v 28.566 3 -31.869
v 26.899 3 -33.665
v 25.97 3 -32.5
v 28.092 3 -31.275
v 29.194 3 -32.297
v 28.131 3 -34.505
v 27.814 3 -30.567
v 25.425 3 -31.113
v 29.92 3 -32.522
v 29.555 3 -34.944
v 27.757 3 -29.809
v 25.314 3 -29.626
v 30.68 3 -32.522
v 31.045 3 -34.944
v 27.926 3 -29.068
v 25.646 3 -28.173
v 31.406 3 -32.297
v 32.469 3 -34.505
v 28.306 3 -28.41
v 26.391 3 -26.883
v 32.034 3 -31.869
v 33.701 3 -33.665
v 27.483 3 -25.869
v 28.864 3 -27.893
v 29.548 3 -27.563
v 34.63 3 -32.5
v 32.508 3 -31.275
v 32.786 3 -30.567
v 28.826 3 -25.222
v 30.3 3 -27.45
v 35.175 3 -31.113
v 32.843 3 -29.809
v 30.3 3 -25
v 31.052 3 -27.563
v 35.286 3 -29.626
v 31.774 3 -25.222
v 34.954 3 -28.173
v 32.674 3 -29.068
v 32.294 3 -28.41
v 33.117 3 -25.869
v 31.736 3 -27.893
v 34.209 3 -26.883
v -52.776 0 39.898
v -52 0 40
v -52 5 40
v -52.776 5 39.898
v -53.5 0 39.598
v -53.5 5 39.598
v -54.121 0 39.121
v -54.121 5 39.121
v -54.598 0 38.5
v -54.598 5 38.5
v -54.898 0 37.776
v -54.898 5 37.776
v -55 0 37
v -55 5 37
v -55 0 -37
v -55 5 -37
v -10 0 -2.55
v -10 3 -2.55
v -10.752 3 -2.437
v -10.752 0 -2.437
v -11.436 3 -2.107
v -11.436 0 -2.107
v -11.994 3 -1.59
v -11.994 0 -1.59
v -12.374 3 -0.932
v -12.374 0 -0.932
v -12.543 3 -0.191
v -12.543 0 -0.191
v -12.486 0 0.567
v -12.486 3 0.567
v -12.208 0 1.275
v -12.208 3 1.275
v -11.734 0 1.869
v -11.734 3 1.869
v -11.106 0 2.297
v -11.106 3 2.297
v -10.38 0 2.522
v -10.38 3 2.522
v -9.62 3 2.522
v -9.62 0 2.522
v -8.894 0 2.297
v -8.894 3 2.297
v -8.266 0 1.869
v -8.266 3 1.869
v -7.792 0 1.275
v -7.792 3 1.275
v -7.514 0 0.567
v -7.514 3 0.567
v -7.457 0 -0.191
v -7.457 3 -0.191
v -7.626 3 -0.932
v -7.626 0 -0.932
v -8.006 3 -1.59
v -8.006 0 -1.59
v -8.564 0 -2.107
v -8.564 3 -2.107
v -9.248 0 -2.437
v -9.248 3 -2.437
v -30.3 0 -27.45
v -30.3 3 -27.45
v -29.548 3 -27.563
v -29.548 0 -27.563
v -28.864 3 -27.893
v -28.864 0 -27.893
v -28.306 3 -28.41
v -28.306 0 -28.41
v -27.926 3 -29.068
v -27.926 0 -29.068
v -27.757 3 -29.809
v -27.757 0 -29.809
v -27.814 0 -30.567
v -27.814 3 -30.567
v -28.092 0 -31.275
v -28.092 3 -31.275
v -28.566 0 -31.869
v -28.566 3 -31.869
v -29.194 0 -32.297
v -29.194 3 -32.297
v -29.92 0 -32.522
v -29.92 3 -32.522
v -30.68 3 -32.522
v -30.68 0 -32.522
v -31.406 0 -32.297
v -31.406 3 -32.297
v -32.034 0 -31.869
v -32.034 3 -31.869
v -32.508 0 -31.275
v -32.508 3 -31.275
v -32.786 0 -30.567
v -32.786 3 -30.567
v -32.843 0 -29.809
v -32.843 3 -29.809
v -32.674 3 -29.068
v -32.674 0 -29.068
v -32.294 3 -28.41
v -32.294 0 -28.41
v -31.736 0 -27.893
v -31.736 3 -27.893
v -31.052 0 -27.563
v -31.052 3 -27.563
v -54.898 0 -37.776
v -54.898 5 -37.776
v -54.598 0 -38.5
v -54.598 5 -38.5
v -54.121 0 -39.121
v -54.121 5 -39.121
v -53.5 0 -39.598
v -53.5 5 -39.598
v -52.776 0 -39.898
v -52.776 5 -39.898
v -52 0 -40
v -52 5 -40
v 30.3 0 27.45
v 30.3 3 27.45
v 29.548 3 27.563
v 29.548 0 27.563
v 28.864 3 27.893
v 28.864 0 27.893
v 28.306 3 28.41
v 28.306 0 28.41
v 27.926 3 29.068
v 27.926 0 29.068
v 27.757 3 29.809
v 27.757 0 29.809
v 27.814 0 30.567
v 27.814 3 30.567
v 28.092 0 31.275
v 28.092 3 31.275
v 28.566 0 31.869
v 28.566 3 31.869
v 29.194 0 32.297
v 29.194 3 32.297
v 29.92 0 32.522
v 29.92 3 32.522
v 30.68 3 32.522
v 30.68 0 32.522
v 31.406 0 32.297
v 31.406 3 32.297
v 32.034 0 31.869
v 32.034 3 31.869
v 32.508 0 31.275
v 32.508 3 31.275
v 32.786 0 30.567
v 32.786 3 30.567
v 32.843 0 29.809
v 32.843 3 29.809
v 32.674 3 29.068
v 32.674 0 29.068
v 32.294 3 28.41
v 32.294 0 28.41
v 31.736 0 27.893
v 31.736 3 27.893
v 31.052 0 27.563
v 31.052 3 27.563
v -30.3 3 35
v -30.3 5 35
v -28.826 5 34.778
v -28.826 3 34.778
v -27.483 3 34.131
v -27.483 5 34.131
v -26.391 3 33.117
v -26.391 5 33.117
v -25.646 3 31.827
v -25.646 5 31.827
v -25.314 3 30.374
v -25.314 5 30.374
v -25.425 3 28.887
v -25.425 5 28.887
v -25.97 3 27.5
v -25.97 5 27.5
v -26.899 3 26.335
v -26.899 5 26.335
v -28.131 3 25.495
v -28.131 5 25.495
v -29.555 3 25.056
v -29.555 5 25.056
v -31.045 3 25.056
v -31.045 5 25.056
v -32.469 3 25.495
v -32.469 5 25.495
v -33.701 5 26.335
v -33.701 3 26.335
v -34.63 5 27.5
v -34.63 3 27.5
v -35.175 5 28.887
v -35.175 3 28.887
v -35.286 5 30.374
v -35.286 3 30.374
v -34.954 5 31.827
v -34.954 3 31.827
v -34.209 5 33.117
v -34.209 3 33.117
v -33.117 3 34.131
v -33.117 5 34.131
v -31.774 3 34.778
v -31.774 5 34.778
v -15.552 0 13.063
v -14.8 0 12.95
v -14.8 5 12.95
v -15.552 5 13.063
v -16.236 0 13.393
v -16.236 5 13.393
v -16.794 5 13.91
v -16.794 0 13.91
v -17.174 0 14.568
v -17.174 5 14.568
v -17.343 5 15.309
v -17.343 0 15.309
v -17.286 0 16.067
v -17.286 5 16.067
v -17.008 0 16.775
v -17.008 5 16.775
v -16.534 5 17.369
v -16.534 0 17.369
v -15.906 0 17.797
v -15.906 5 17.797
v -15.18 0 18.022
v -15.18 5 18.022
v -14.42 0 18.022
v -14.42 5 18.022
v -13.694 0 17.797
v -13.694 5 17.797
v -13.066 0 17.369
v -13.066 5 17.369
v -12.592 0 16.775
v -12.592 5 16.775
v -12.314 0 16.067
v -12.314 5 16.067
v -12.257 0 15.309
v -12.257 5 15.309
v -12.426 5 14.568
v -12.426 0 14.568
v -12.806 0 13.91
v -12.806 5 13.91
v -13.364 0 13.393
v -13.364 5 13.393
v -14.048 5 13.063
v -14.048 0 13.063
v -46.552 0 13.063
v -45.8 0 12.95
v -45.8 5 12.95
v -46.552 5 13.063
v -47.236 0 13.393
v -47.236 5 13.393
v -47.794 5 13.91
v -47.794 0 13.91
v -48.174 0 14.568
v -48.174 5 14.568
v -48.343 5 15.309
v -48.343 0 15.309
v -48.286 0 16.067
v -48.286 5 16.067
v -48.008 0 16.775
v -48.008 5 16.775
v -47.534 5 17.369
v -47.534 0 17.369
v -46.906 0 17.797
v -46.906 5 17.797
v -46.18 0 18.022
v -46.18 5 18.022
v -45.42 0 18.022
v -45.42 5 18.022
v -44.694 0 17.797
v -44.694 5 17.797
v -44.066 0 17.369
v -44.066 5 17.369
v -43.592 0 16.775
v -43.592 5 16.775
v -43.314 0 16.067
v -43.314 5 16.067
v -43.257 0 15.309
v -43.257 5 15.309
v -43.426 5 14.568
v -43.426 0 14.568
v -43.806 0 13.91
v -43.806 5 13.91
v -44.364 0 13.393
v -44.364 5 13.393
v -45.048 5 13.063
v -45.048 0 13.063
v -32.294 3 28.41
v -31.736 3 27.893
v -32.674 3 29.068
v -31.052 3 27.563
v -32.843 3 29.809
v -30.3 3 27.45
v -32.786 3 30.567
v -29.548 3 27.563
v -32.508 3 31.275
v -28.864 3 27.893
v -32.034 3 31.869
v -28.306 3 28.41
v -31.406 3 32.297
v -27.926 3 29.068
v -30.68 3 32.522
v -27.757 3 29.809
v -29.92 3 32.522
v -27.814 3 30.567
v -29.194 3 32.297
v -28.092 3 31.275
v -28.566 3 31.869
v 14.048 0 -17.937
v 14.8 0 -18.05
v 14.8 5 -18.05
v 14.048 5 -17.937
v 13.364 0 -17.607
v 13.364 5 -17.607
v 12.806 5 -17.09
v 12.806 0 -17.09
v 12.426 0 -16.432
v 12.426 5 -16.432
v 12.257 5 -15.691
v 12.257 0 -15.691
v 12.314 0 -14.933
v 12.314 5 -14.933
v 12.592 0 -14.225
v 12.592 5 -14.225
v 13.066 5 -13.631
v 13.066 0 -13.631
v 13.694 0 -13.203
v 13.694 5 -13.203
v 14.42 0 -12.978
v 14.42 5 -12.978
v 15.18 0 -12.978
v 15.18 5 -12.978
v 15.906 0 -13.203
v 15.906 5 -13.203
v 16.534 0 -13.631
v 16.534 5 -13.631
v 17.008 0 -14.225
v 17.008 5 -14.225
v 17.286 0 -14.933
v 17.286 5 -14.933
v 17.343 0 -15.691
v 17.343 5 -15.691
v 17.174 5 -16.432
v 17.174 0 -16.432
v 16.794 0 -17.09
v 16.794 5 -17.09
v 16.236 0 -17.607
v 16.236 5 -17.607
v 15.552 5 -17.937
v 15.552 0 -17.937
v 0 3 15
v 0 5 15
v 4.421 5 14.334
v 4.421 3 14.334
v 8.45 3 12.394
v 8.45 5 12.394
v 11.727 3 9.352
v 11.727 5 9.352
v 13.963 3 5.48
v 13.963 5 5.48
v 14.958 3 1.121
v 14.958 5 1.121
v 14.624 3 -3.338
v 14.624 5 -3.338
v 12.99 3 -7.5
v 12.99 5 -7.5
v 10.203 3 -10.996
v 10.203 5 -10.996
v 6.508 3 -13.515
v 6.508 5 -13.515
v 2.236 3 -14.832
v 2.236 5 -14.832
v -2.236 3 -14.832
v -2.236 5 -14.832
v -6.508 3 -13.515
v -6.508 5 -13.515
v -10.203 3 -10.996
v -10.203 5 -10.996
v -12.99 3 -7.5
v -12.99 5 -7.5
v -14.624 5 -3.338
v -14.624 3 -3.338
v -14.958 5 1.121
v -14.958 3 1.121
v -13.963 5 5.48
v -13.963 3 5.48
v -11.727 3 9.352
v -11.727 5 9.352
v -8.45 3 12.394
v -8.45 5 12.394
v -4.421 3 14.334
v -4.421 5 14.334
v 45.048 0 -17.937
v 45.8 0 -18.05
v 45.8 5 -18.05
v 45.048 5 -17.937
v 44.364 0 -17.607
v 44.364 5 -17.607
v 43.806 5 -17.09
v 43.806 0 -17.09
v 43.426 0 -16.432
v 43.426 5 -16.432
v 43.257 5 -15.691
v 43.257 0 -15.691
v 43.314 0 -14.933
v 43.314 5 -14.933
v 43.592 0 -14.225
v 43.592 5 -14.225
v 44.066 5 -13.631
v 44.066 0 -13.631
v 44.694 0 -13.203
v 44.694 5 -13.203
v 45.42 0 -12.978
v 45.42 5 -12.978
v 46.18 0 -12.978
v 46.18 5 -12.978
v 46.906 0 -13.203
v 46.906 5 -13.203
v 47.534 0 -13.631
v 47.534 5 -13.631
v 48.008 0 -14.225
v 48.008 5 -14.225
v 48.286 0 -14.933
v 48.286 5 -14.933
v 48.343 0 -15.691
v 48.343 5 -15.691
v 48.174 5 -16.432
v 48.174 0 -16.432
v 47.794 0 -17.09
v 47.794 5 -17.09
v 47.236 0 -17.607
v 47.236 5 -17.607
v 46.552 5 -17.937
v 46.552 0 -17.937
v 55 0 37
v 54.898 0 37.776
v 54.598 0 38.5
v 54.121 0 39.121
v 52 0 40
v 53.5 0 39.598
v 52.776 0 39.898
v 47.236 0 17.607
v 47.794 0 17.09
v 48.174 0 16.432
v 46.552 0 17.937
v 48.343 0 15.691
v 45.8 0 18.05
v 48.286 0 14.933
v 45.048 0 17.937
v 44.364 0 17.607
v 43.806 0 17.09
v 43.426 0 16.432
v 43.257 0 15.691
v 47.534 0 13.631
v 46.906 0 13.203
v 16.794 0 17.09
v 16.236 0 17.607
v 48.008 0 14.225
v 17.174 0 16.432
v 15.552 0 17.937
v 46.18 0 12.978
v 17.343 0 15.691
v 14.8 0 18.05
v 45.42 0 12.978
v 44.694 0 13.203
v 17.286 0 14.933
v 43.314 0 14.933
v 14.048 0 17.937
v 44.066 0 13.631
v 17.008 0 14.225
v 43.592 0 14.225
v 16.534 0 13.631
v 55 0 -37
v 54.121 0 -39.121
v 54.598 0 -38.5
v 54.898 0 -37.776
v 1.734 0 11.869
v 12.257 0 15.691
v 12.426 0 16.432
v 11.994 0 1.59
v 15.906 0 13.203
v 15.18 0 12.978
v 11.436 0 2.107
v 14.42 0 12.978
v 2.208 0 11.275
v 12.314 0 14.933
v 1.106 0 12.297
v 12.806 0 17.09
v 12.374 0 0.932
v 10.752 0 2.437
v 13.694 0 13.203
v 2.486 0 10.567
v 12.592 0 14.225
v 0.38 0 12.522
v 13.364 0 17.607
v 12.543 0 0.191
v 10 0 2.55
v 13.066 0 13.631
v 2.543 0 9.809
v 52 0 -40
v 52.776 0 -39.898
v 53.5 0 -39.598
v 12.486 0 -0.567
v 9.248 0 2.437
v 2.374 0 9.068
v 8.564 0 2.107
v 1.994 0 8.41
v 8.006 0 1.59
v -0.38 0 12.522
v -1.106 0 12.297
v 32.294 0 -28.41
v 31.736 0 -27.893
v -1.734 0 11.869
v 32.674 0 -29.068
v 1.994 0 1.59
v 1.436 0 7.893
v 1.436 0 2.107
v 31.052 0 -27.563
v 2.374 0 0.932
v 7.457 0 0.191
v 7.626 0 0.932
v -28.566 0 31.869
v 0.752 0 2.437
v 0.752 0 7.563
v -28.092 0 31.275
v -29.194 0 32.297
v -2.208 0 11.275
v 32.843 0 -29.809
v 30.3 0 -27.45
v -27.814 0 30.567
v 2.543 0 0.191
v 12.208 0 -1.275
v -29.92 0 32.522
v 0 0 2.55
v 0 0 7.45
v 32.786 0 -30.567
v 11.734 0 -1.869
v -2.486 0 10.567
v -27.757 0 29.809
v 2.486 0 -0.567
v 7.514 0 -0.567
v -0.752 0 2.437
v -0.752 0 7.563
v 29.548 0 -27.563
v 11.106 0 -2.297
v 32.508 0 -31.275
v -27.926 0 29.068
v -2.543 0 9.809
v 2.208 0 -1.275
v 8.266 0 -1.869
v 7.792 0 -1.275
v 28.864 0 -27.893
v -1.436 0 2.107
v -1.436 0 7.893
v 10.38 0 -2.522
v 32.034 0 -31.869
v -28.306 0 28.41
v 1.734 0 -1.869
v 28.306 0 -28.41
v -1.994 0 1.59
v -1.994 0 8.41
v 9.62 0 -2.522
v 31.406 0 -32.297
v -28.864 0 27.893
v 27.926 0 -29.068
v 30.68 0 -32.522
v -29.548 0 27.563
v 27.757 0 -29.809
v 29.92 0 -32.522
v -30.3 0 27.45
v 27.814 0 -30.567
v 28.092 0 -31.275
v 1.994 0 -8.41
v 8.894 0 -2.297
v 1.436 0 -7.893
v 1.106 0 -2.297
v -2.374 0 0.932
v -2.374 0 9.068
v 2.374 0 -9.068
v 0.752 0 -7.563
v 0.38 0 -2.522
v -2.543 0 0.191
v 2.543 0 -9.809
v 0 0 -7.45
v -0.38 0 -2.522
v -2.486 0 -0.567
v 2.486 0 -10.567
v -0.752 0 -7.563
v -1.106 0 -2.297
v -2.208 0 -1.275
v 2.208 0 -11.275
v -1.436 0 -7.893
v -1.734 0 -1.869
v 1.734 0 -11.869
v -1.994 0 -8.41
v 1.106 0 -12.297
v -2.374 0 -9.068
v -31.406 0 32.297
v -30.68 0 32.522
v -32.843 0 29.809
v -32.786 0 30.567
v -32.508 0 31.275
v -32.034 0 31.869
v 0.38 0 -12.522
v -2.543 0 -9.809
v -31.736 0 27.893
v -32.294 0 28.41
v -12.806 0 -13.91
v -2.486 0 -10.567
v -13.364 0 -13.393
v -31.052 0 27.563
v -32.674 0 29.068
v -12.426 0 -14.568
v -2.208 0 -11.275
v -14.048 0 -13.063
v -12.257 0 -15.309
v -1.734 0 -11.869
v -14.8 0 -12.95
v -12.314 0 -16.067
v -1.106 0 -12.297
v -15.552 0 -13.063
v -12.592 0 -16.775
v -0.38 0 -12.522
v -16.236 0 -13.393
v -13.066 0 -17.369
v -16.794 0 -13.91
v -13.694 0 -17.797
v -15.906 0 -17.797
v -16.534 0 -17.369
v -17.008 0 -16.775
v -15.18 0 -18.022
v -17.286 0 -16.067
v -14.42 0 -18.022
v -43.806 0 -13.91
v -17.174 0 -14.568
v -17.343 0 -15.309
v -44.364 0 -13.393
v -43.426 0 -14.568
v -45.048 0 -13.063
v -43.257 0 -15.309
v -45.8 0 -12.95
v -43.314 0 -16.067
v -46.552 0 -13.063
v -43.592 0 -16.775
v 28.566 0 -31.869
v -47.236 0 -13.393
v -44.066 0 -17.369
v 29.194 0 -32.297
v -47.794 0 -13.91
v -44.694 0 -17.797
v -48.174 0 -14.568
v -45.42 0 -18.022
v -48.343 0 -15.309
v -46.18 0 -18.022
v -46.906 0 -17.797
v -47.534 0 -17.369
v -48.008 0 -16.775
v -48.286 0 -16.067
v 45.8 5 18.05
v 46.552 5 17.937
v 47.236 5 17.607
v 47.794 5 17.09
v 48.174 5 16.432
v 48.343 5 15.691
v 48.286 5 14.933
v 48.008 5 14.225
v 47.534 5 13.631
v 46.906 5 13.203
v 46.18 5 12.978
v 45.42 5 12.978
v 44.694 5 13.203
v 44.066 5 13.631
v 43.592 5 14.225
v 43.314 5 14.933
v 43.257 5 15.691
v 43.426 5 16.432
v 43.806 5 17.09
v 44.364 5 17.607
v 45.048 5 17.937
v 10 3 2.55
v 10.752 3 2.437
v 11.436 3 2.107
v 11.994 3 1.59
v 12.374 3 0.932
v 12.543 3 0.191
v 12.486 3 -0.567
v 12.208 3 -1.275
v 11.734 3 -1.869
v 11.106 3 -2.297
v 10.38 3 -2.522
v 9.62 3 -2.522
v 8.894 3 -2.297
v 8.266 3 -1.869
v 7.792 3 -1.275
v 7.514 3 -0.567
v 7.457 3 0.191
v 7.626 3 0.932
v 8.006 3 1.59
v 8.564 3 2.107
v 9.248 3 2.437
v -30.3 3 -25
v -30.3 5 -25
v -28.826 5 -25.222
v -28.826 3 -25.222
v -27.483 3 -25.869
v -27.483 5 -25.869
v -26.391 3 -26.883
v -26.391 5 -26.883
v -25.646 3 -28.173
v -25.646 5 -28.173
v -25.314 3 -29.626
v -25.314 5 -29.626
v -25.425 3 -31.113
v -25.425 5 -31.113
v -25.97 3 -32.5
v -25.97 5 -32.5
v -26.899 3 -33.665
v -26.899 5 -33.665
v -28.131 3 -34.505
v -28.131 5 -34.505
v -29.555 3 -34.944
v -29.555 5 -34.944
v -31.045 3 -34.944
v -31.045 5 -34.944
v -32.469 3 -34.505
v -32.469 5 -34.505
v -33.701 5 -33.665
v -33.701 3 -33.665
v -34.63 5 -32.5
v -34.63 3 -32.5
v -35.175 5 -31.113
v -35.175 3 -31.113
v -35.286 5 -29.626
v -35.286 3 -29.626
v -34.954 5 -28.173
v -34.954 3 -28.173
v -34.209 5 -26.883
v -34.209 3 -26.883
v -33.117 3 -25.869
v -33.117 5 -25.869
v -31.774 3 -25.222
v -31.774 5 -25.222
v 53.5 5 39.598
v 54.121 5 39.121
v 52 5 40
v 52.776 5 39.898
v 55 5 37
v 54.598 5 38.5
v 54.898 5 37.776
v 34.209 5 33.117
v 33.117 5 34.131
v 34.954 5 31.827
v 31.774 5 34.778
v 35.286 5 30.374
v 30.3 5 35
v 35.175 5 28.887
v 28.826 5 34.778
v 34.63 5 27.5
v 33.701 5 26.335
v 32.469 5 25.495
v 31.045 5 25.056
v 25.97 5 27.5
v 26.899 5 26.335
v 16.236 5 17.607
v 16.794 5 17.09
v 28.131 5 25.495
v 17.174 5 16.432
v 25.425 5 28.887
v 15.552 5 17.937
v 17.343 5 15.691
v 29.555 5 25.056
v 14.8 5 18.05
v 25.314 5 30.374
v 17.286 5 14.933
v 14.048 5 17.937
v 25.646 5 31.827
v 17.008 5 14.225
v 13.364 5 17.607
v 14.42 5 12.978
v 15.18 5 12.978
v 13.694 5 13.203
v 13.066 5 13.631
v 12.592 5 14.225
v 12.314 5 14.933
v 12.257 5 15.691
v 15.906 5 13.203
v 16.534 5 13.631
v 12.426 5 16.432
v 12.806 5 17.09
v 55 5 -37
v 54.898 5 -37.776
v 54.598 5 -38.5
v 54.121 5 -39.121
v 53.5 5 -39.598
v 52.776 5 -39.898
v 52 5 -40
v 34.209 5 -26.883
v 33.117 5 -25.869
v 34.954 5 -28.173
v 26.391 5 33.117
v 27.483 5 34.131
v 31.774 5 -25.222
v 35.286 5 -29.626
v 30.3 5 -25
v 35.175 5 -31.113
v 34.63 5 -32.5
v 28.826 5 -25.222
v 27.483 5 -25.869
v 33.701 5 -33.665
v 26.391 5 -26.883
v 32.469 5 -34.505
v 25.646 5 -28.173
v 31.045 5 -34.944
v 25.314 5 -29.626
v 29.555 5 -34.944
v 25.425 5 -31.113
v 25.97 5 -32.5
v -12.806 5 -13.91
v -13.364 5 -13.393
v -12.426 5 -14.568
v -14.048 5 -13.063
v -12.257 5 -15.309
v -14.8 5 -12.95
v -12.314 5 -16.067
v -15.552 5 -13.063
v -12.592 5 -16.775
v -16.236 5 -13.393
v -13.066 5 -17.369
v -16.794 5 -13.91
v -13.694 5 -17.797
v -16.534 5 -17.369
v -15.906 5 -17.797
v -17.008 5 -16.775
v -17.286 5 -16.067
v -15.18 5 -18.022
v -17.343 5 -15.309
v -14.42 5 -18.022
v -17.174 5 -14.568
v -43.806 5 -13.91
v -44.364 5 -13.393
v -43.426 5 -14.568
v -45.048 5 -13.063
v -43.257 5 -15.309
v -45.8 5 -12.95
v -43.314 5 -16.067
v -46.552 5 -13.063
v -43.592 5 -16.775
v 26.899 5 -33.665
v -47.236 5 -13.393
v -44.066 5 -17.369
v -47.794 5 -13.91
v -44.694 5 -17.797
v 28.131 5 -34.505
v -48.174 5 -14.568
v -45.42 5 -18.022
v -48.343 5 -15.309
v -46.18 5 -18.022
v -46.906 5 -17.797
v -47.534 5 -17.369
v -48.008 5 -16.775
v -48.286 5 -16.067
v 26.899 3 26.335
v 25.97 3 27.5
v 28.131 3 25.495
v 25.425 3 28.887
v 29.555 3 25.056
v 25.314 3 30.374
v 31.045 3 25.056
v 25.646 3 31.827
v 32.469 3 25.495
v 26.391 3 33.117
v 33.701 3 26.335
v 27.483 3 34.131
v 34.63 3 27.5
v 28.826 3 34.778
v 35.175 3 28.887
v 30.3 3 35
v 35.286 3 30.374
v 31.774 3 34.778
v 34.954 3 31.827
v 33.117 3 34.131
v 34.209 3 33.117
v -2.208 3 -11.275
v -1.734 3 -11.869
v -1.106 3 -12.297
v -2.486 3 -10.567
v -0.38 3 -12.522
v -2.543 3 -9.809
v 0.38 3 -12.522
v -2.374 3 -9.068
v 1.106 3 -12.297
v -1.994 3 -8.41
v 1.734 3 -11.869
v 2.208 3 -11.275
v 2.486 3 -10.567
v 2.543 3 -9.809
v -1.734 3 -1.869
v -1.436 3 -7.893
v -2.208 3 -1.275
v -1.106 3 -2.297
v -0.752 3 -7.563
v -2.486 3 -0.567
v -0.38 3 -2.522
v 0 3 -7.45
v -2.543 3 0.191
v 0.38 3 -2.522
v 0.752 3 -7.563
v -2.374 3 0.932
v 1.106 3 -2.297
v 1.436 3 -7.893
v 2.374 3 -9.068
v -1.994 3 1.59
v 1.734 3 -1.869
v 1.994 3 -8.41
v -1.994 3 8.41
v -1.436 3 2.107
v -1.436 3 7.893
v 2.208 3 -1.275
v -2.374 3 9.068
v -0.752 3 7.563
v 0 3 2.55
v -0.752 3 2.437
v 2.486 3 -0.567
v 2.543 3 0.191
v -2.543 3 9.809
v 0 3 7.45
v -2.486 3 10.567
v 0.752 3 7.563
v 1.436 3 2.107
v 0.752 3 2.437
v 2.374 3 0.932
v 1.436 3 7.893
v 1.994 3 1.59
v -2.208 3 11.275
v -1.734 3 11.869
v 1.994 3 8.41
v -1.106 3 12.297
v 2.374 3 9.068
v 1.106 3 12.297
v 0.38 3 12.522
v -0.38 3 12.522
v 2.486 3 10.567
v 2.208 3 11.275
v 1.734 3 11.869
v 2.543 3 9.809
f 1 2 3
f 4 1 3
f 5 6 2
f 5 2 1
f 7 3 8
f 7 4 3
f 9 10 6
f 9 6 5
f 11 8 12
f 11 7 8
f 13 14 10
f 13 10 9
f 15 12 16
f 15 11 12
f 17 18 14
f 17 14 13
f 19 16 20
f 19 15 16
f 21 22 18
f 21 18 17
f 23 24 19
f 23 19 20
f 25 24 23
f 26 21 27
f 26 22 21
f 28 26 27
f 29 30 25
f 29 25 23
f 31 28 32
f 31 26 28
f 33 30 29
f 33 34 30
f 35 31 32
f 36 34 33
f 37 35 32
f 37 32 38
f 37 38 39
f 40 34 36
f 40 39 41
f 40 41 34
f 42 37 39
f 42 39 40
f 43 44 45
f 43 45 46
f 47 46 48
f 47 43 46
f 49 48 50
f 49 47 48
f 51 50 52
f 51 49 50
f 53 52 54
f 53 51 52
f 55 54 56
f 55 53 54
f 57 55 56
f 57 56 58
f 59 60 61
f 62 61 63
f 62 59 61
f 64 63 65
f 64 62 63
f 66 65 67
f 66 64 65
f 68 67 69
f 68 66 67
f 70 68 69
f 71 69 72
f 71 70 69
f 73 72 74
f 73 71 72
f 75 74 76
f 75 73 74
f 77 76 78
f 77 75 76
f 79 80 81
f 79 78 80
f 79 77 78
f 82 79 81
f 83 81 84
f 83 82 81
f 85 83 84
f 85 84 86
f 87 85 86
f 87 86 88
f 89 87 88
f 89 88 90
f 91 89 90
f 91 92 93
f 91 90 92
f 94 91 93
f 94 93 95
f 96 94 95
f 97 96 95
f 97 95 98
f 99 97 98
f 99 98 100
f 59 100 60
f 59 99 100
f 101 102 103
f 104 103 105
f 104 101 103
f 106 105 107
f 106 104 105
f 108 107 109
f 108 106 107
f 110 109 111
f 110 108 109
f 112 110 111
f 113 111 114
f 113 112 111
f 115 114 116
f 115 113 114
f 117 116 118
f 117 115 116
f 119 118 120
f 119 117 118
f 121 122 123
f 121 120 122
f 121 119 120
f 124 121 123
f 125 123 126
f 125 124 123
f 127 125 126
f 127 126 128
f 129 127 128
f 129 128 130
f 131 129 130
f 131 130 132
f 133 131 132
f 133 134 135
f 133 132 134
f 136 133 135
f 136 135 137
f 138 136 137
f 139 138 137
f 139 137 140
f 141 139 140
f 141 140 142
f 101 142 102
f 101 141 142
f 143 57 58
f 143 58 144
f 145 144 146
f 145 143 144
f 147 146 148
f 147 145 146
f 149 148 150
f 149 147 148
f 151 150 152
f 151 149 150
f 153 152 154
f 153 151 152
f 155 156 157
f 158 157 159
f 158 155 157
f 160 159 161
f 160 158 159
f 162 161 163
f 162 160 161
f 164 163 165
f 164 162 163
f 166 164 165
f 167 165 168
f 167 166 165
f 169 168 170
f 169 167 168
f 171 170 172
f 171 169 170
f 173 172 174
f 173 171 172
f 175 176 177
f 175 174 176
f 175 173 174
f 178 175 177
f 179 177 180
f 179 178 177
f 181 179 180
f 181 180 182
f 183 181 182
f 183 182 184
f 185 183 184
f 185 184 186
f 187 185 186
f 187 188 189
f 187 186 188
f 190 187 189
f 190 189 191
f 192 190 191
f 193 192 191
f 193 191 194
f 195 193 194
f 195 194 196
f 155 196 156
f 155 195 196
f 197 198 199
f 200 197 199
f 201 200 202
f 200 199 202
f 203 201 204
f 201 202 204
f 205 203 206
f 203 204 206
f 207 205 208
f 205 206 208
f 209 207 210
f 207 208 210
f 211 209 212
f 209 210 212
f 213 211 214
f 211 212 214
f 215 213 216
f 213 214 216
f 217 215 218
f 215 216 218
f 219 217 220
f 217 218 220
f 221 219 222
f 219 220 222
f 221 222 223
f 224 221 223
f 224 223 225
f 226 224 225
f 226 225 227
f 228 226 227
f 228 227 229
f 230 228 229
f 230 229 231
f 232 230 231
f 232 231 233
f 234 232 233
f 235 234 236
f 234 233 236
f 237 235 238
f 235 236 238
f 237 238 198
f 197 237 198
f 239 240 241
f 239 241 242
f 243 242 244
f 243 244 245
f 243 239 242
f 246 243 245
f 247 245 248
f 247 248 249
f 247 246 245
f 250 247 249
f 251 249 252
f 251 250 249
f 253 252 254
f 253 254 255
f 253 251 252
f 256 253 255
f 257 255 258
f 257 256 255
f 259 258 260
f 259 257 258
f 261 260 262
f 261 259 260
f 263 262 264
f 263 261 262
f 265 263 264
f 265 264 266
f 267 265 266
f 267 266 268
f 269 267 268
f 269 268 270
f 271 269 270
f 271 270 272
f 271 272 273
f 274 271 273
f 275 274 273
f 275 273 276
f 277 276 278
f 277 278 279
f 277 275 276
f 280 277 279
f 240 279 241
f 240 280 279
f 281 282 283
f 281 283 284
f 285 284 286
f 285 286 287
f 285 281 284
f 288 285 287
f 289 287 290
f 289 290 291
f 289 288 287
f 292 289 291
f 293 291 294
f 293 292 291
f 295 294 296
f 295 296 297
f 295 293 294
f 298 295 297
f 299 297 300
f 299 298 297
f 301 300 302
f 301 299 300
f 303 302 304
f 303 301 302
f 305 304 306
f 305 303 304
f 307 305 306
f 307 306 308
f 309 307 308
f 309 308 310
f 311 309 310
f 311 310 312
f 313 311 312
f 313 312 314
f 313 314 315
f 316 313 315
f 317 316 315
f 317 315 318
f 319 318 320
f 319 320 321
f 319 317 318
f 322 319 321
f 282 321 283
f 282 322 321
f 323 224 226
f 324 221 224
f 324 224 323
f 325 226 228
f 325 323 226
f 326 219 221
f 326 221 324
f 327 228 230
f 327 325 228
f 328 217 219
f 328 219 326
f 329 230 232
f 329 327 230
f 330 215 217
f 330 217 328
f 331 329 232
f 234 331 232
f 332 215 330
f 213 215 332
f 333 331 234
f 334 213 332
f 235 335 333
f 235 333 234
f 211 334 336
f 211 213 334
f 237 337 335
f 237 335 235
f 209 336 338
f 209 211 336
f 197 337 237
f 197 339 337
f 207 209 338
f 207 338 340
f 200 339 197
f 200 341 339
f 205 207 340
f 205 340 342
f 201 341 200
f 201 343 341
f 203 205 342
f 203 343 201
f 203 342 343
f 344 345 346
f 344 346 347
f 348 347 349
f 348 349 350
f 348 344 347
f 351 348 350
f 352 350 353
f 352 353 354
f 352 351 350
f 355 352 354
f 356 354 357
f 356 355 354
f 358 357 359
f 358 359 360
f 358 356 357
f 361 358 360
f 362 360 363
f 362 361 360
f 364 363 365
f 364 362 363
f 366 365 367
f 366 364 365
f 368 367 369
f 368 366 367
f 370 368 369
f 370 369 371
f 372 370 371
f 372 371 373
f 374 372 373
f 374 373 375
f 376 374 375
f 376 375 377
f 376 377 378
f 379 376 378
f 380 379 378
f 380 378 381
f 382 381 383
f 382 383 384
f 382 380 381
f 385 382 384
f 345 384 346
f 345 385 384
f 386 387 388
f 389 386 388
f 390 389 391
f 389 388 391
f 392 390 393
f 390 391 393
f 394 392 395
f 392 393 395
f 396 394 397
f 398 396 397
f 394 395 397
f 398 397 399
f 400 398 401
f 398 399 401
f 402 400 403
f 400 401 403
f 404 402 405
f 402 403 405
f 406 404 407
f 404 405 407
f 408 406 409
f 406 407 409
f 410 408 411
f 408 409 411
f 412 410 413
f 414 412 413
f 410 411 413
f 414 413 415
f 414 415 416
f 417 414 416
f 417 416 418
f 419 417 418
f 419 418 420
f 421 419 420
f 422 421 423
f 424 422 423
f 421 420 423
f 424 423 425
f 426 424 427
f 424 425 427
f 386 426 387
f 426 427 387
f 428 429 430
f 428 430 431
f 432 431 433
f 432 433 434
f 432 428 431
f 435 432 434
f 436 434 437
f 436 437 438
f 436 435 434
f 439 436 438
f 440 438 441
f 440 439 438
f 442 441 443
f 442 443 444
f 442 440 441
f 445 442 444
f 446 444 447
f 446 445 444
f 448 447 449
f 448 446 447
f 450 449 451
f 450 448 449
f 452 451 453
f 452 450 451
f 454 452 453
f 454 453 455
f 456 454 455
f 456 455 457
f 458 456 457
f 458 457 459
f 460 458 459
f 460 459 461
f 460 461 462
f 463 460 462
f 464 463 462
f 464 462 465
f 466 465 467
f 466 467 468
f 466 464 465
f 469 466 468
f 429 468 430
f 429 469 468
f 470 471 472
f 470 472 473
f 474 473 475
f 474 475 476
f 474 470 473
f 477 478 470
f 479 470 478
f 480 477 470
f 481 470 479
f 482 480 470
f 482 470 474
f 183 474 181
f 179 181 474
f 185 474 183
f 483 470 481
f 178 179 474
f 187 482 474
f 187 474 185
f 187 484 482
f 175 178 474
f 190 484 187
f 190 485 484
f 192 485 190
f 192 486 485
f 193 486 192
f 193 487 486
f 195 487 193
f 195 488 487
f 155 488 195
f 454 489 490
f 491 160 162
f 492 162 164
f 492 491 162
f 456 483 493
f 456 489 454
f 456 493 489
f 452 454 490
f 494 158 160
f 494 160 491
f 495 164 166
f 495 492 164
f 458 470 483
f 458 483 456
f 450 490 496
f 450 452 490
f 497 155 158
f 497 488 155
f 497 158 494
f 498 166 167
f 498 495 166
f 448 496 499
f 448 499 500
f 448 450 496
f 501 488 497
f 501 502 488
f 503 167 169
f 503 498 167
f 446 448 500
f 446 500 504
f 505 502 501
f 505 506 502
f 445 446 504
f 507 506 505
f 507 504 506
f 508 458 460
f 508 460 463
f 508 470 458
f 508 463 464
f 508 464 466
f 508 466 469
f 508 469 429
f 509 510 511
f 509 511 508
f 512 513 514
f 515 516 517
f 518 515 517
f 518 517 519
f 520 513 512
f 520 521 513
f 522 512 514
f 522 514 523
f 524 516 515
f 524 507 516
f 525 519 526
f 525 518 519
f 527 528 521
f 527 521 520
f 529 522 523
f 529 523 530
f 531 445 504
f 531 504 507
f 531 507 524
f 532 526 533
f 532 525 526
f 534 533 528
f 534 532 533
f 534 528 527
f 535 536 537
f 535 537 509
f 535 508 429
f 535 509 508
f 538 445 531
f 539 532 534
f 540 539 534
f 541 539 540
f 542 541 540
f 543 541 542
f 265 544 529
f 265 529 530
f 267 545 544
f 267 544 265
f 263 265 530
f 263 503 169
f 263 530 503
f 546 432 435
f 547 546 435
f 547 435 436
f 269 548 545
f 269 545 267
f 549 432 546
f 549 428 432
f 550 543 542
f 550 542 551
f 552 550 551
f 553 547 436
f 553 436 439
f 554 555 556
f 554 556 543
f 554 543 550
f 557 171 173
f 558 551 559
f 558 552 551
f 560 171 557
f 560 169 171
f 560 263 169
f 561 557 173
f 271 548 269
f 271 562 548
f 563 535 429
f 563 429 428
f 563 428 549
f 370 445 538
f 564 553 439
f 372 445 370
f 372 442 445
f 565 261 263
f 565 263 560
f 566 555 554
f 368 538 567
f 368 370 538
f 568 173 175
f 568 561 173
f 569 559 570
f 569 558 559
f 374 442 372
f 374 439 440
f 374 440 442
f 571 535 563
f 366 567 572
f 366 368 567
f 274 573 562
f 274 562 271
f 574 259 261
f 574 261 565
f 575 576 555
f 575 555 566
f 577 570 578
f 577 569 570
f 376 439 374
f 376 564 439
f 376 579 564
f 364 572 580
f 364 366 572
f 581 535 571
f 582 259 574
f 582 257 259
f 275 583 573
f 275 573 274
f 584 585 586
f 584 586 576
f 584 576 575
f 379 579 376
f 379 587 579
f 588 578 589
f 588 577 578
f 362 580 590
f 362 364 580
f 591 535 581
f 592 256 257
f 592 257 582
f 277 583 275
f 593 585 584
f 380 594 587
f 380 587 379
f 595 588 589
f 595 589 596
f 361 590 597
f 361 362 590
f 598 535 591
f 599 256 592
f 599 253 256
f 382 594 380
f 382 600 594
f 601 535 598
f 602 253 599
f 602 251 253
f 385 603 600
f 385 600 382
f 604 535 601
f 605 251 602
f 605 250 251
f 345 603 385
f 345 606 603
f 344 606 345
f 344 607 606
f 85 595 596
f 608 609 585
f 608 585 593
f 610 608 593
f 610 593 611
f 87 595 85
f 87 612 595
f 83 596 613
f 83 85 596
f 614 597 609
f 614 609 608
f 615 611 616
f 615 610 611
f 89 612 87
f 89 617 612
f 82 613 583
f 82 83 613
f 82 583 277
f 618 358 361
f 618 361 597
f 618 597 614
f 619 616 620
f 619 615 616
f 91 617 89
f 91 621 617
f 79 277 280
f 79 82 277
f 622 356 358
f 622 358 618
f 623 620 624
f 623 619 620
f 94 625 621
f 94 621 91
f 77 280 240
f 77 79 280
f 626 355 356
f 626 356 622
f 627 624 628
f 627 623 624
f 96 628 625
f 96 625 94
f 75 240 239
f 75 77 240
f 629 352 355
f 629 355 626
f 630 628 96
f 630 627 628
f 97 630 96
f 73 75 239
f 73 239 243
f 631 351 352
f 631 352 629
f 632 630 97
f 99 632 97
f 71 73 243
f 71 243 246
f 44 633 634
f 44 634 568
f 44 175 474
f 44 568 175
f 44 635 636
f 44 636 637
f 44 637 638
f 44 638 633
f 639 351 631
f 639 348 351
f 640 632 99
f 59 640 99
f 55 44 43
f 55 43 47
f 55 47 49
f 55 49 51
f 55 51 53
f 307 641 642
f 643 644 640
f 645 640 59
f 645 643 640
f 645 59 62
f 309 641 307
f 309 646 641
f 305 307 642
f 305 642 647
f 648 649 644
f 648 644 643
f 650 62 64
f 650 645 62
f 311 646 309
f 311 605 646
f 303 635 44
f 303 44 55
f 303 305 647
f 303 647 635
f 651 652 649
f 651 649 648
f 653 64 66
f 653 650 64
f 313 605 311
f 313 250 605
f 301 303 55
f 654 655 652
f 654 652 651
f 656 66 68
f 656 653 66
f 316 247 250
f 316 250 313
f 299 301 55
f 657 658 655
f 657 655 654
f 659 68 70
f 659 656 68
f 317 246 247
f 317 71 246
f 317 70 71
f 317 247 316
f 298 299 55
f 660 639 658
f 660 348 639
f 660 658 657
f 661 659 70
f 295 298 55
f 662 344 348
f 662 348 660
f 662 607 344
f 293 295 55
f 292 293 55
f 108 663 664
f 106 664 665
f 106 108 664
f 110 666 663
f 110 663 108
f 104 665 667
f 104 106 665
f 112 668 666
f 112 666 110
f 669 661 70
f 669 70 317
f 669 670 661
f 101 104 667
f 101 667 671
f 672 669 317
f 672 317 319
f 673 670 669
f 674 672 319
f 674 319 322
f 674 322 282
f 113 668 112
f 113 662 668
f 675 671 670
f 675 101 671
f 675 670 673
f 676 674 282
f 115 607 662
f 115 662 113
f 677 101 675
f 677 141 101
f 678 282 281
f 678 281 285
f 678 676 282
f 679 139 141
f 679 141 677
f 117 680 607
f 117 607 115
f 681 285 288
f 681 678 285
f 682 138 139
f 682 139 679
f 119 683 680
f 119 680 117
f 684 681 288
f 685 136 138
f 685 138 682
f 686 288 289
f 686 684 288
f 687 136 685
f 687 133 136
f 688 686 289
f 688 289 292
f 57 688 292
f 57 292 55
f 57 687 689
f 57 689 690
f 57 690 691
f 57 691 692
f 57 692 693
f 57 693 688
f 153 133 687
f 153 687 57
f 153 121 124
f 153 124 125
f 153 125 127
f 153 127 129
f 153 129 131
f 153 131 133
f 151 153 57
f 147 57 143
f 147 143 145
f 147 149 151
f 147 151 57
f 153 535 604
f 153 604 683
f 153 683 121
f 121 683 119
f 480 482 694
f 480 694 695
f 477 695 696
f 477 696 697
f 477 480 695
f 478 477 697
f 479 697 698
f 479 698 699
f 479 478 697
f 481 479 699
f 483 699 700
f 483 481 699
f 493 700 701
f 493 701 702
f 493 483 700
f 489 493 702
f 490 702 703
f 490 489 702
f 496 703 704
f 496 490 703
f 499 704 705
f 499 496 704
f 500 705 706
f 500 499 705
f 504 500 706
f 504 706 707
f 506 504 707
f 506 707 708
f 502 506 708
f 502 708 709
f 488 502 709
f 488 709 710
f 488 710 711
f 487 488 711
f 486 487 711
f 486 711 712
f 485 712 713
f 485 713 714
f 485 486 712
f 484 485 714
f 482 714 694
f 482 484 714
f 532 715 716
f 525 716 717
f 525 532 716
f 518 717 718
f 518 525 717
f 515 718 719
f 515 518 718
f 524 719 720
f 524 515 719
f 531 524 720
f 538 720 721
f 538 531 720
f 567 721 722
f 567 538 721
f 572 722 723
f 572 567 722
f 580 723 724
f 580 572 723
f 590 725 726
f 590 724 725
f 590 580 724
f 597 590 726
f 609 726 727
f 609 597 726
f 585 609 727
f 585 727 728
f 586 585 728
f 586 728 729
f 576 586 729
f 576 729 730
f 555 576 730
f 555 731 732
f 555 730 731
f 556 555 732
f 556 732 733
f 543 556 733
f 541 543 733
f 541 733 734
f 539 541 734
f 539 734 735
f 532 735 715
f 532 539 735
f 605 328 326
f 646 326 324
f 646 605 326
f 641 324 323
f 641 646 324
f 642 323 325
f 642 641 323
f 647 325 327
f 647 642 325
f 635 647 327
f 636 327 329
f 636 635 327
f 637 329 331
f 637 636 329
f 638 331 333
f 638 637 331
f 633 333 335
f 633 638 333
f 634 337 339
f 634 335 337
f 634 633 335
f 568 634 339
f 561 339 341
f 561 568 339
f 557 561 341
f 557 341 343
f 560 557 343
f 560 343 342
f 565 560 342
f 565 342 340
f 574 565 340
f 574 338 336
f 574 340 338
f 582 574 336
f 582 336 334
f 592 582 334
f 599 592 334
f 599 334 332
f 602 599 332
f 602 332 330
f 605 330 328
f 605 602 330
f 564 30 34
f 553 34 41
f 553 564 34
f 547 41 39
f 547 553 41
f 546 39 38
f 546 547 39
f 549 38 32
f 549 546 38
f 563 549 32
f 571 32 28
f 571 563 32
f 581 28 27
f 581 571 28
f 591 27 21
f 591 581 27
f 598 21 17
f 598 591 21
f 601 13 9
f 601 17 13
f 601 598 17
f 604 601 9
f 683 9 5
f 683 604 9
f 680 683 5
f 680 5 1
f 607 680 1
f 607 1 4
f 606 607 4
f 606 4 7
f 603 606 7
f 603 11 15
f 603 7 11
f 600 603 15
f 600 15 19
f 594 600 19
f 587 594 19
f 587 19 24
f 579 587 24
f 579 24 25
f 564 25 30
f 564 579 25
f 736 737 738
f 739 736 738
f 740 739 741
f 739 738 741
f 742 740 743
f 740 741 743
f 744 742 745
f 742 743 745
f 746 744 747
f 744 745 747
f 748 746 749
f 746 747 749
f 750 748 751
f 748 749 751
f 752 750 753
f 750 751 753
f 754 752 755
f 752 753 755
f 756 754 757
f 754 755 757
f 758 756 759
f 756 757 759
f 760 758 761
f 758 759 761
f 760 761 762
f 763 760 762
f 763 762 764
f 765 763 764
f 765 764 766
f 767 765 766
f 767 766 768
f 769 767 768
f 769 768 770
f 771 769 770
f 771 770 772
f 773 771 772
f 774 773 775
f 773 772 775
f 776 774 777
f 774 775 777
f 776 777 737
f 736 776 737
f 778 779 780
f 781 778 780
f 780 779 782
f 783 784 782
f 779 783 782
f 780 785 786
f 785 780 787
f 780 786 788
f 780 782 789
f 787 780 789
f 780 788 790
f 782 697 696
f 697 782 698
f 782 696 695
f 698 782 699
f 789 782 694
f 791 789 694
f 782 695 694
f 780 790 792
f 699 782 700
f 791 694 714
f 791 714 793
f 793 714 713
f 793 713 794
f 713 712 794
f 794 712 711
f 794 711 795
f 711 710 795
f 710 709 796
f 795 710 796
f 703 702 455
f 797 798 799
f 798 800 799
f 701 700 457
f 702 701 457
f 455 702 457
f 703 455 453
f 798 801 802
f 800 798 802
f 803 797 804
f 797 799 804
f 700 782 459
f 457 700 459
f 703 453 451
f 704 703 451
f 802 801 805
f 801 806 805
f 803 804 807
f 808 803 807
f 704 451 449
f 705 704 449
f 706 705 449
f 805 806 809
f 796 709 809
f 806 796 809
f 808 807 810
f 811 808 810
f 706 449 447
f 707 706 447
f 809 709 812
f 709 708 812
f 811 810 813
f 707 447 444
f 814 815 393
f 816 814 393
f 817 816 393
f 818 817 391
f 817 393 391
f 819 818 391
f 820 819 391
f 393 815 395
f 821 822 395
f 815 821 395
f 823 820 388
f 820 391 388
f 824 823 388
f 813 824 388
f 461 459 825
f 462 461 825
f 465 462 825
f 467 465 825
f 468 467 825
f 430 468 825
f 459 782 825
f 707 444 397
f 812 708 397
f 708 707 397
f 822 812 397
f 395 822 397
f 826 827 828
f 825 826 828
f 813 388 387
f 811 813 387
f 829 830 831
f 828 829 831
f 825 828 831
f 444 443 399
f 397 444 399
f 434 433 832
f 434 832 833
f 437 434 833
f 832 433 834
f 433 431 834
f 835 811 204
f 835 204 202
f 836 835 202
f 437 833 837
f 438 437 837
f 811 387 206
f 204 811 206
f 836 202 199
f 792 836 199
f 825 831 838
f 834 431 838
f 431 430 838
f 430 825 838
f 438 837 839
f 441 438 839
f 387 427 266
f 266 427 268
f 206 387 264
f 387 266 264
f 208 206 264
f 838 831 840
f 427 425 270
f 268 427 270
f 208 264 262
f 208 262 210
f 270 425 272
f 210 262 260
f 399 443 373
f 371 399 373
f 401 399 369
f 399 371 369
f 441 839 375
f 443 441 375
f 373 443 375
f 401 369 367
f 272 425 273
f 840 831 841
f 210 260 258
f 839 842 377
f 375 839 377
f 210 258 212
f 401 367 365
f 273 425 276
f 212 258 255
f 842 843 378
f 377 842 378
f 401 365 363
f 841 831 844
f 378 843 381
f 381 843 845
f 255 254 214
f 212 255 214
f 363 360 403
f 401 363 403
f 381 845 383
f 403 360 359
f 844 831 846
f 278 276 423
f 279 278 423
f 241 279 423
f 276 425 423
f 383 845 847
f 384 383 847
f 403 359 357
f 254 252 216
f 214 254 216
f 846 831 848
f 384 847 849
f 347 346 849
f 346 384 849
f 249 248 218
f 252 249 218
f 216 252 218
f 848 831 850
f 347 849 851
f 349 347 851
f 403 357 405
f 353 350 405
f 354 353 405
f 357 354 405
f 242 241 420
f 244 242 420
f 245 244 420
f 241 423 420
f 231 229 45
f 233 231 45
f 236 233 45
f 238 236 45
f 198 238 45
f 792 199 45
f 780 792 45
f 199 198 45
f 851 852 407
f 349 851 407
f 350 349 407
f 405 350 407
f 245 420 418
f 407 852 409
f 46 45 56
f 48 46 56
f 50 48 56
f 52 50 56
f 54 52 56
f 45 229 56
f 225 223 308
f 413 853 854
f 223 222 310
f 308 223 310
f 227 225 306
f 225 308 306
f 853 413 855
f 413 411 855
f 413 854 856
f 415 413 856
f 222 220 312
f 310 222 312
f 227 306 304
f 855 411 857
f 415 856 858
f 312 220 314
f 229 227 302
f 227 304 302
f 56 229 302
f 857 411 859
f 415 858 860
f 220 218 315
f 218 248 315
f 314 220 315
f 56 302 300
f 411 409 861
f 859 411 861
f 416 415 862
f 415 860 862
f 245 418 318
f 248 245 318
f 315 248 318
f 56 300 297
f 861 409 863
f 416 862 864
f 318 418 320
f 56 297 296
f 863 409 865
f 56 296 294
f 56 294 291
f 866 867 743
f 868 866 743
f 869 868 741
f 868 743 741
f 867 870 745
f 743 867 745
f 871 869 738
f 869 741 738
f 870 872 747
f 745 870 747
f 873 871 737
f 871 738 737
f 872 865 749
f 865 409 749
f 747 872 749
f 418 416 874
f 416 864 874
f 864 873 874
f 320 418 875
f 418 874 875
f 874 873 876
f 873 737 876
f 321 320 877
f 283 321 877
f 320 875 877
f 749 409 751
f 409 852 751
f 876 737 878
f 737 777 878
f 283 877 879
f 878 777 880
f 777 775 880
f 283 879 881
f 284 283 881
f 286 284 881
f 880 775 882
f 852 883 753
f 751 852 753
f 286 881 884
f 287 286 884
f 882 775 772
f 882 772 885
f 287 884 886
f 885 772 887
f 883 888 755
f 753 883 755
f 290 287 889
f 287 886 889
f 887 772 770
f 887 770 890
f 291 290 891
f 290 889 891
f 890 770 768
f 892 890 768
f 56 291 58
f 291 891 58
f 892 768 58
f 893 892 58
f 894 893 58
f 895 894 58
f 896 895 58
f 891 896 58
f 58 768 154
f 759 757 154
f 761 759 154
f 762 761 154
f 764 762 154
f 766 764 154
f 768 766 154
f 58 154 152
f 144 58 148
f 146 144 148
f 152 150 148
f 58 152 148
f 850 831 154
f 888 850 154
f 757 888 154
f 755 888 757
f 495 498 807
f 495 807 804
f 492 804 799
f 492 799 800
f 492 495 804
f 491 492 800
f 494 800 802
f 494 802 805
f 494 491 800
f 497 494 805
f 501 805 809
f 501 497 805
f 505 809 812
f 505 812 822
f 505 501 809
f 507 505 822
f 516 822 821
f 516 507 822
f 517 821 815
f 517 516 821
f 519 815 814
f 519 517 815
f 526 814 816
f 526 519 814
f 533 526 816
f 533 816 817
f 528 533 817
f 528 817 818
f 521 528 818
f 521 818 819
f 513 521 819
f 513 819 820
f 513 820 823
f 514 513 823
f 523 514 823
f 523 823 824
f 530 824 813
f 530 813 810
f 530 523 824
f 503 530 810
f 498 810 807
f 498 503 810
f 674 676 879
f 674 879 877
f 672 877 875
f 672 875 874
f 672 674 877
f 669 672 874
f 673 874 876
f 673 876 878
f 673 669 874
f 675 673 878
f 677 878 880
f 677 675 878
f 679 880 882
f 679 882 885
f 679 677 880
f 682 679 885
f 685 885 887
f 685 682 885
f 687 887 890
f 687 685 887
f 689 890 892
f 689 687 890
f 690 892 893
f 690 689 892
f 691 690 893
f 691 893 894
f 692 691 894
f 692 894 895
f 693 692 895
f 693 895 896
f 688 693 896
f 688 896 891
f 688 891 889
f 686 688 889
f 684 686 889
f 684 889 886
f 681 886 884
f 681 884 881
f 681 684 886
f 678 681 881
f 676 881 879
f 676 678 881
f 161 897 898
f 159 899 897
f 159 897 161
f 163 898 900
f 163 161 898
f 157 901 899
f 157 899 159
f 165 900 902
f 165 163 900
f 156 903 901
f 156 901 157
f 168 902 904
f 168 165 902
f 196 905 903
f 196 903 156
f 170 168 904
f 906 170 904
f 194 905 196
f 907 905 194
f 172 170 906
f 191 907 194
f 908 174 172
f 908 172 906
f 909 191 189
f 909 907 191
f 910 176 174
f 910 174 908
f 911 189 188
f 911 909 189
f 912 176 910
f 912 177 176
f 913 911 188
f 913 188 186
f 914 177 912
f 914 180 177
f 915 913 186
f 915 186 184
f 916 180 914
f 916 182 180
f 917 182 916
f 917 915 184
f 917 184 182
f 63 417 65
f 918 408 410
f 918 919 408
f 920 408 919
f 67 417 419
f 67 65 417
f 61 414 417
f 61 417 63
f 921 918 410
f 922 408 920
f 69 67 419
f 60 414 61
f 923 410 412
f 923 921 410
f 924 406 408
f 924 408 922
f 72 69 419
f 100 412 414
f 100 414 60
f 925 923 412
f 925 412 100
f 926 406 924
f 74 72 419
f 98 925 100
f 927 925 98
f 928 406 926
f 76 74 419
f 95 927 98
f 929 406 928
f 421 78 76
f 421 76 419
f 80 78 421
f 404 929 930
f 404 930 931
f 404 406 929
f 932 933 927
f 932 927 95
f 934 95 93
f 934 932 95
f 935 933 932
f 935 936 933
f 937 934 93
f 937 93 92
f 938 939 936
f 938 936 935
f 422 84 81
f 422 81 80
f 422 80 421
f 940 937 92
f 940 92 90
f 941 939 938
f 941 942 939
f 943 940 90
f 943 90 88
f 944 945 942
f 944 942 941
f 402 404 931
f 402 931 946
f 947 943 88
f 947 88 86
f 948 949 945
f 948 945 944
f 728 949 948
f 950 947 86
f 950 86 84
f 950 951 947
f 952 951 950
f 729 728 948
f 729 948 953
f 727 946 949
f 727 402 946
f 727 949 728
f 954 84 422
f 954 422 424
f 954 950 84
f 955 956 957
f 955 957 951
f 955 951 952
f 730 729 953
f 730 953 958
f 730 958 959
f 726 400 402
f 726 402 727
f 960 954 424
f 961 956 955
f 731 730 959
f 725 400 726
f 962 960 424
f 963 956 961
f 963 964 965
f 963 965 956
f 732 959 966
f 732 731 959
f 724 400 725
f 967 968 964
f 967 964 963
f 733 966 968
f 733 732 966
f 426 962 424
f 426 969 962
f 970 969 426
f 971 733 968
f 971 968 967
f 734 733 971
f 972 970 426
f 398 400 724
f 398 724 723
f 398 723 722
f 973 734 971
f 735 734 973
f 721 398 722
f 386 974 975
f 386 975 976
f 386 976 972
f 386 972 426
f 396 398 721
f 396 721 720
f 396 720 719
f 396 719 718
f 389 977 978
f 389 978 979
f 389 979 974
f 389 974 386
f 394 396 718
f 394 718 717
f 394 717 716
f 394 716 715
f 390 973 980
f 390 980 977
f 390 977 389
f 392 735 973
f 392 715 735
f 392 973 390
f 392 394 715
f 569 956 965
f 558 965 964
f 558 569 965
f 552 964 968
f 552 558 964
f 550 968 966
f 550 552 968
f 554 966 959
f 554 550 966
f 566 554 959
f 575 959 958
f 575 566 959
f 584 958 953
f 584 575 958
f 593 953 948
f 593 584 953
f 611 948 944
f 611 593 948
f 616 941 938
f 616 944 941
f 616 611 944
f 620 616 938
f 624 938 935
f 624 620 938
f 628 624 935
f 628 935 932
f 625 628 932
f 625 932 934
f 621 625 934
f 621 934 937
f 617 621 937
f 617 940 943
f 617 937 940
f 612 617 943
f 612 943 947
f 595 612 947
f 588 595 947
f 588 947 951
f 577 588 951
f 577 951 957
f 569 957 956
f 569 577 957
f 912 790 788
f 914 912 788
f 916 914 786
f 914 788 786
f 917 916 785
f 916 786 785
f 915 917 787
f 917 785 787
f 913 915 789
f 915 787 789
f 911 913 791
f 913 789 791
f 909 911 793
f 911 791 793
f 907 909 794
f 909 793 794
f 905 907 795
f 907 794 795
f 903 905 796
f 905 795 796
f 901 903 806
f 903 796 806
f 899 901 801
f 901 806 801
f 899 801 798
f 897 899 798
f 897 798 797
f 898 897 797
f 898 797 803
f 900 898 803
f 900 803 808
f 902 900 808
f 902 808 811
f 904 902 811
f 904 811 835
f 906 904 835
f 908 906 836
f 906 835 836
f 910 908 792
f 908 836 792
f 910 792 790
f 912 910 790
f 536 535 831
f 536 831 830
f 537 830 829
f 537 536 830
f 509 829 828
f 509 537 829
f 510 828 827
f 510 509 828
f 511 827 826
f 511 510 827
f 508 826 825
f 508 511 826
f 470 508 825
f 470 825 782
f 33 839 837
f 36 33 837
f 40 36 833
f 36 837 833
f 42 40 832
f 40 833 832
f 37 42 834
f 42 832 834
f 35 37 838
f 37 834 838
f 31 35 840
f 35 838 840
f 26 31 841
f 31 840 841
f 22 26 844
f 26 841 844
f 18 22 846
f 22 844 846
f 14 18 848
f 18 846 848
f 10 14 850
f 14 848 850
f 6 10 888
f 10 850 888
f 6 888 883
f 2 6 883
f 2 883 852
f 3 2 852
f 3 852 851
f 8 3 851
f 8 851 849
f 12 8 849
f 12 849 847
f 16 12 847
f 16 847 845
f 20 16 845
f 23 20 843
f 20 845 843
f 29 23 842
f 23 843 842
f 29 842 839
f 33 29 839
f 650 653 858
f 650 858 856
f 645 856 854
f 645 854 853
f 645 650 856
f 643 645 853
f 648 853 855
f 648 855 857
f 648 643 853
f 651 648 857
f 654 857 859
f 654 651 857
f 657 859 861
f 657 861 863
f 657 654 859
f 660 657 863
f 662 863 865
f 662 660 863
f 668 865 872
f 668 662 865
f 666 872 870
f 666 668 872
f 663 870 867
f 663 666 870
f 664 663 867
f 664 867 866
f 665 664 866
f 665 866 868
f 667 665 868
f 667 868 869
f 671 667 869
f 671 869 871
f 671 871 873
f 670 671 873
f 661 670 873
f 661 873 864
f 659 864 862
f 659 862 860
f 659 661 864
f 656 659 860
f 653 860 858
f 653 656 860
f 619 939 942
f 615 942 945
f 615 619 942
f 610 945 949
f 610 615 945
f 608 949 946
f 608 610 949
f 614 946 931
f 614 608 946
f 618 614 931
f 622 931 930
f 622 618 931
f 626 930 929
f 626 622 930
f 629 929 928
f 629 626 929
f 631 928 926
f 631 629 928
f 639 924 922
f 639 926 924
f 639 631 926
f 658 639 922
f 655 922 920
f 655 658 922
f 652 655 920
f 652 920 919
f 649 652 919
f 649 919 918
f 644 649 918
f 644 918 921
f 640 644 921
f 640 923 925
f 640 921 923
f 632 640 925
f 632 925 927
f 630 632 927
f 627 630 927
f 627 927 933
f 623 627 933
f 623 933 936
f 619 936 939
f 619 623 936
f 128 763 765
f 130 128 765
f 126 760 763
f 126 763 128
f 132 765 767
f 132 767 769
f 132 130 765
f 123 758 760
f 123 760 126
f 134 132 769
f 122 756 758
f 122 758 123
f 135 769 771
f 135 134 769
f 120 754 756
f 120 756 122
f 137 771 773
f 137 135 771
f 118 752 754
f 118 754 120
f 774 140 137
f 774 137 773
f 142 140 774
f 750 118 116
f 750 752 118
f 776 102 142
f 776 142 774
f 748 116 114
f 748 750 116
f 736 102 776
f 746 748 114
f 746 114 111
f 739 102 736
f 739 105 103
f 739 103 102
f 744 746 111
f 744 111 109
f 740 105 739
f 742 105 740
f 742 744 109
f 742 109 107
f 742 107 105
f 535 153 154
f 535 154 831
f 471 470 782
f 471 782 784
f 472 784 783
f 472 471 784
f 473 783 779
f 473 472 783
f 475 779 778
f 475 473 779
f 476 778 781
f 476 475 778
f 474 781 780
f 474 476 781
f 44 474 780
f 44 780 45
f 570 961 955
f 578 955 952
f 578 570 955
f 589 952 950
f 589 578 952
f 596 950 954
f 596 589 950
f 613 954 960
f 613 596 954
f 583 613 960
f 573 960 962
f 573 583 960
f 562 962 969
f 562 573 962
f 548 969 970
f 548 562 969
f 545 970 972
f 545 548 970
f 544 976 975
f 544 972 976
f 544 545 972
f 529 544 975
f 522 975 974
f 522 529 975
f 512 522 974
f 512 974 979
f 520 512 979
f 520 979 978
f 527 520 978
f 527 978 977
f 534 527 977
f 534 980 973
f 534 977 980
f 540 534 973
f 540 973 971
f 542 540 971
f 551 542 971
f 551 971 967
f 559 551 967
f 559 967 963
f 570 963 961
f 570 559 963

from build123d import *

# Parameters (mm, degrees)
SKETCH1_R           = 2.55
BOSS_EXTRUDE1_DEPTH = 5
SKETCH_1_R          = 5
SKETCH_1_R_2        = 15
CUT_EXTRUDE_1_DEPTH = 2


with BuildPart() as part:
    # Sketch1 → Boss-Extrude1 (new body)
    with BuildSketch(Plane(origin=(0, 0, 0), x_dir=(1, 0, 0), z_dir=(0, 1, 0))):
        with BuildLine():
            Line((52, -40), (-52, -40))
            ThreePointArc((-52, -40), (-54.121320344, -39.121320344), (-55, -37))
            Line((-55, -37), (-55, 37))
            ThreePointArc((-55, 37), (-54.121320344, 39.121320344), (-52, 40))
            Line((-52, 40), (52, 40))
            ThreePointArc((52, 40), (54.121320344, 39.121320344), (55, 37))
            Line((55, 37), (55, -37))
            ThreePointArc((55, -37), (54.121320344, -39.121320344), (52, -40))
        make_face()
        with Locations(Location((-30.3, 30, 0), (0, 0, 270))):
            Circle(SKETCH1_R, mode=Mode.SUBTRACT)
        with Locations(Location((0, 10, 0), (0, 0, 270))):
            Circle(SKETCH1_R, mode=Mode.SUBTRACT)
        with Locations(Location((0, 0, 0), (0, 0, 270))):
            Circle(SKETCH1_R, mode=Mode.SUBTRACT)
        with Locations(Location((10, 0, 0), (0, 0, 270))):
            Circle(SKETCH1_R, mode=Mode.SUBTRACT)
        with Locations(Location((-10, 0, 0), (0, 0, 90))):
            Circle(SKETCH1_R, mode=Mode.SUBTRACT)
        with Locations(Location((-45.8, 15.5, 0), (0, 0, 270))):
            Circle(SKETCH1_R, mode=Mode.SUBTRACT)
        with Locations(Location((30.3, 30, 0), (0, 0, 270))):
            Circle(SKETCH1_R, mode=Mode.SUBTRACT)
        with Locations(Location((0, -10, 0), (0, 0, 90))):
            Circle(SKETCH1_R, mode=Mode.SUBTRACT)
        with Locations(Location((-14.8, 15.5, 0), (0, 0, 270))):
            Circle(SKETCH1_R, mode=Mode.SUBTRACT)
        with Locations(Location((14.8, 15.5, 0), (0, 0, 90))):
            Circle(SKETCH1_R, mode=Mode.SUBTRACT)
        with Locations(Location((45.8, 15.5, 0), (0, 0, 90))):
            Circle(SKETCH1_R, mode=Mode.SUBTRACT)
        with Locations(Location((30.3, -30, 0), (0, 0, 90))):
            Circle(SKETCH1_R, mode=Mode.SUBTRACT)
        with Locations(Location((45.8, -15.5, 0), (0, 0, 270))):
            Circle(SKETCH1_R, mode=Mode.SUBTRACT)
        with Locations(Location((14.8, -15.5, 0), (0, 0, 270))):
            Circle(SKETCH1_R, mode=Mode.SUBTRACT)
        with Locations(Location((-14.8, -15.5, 0), (0, 0, 90))):
            Circle(SKETCH1_R, mode=Mode.SUBTRACT)
        with Locations(Location((-45.8, -15.5, 0), (0, 0, 90))):
            Circle(SKETCH1_R, mode=Mode.SUBTRACT)
        with Locations(Location((-30.3, -30, 0), (0, 0, 90))):
            Circle(SKETCH1_R, mode=Mode.SUBTRACT)
    extrude(amount=BOSS_EXTRUDE1_DEPTH)

    # 草圖1 → 除料-伸長1 (cut)
    with BuildSketch(Plane(origin=(0, 5, 0), x_dir=(1, 0, 0), z_dir=(0, 1, 0))):
        with Locations(Location((-30.3, -30, 0), (0, 0, 270))):
            Circle(SKETCH_1_R)
        with Locations(Location((-30.3, 30, 0), (0, 0, 270))):
            Circle(SKETCH_1_R)
        with Locations(Location((30.3, -30, 0), (0, 0, 270))):
            Circle(SKETCH_1_R)
        with Locations(Location((30.3, 30, 0), (0, 0, 270))):
            Circle(SKETCH_1_R)
        with Locations(Location((0, 0, 0), (0, 0, 270))):
            Circle(SKETCH_1_R_2)
    extrude(amount=-CUT_EXTRUDE_1_DEPTH, mode=Mode.SUBTRACT)


solid = part.part
